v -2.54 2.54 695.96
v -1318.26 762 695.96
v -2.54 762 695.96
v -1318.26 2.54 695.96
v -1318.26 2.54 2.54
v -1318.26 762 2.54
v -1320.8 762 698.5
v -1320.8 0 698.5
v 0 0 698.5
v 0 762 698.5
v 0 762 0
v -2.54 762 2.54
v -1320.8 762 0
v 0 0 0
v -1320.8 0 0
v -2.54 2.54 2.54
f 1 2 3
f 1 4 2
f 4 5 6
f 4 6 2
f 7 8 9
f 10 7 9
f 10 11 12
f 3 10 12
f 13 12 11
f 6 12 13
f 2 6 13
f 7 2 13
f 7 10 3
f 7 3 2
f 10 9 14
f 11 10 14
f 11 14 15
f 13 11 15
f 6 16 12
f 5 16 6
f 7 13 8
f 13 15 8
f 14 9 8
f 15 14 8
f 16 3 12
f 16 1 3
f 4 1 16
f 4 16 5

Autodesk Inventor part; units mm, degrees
ref_plane "YZ Plane" through (0, 0, 0) normal (1, 0, 0) x (0, 1, 0)
ref_plane "XZ Plane" through (0, 0, 0) normal (0, 1, 0) x (-1, 0, 0)
ref_plane "XY Plane" through (0, 0, 0) normal (0, 0, 1) x (1, 0, 0)
sketch "Sketch1" plane through (0, 0, 0) normal (0, 1, 0) x (-1, 0, 0)
  point P0 (0, 0)
sketch "Sketch2" plane through (0, 0, 0) normal (0, 1, 0) x (-1, 0, 0)
  line L0 (0, 0) -> (1320.8, 0)
  line L1 (1320.8, 0) -> (1320.8, 698.5)
  line L2 (1320.8, 698.5) -> (0, 698.5)
  line L3 (0, 698.5) -> (0, 0)
  dimension "d0" = 1320.8
  dimension "d1" = 698.5
extrude "Extrusion1" add sketch "Sketch2" along normal blind 762
shell "Shell1" thickness 2.54 removed faces 1 at (-440.2667, 762, 465.6667)
properties part number "Crate Stacker"
